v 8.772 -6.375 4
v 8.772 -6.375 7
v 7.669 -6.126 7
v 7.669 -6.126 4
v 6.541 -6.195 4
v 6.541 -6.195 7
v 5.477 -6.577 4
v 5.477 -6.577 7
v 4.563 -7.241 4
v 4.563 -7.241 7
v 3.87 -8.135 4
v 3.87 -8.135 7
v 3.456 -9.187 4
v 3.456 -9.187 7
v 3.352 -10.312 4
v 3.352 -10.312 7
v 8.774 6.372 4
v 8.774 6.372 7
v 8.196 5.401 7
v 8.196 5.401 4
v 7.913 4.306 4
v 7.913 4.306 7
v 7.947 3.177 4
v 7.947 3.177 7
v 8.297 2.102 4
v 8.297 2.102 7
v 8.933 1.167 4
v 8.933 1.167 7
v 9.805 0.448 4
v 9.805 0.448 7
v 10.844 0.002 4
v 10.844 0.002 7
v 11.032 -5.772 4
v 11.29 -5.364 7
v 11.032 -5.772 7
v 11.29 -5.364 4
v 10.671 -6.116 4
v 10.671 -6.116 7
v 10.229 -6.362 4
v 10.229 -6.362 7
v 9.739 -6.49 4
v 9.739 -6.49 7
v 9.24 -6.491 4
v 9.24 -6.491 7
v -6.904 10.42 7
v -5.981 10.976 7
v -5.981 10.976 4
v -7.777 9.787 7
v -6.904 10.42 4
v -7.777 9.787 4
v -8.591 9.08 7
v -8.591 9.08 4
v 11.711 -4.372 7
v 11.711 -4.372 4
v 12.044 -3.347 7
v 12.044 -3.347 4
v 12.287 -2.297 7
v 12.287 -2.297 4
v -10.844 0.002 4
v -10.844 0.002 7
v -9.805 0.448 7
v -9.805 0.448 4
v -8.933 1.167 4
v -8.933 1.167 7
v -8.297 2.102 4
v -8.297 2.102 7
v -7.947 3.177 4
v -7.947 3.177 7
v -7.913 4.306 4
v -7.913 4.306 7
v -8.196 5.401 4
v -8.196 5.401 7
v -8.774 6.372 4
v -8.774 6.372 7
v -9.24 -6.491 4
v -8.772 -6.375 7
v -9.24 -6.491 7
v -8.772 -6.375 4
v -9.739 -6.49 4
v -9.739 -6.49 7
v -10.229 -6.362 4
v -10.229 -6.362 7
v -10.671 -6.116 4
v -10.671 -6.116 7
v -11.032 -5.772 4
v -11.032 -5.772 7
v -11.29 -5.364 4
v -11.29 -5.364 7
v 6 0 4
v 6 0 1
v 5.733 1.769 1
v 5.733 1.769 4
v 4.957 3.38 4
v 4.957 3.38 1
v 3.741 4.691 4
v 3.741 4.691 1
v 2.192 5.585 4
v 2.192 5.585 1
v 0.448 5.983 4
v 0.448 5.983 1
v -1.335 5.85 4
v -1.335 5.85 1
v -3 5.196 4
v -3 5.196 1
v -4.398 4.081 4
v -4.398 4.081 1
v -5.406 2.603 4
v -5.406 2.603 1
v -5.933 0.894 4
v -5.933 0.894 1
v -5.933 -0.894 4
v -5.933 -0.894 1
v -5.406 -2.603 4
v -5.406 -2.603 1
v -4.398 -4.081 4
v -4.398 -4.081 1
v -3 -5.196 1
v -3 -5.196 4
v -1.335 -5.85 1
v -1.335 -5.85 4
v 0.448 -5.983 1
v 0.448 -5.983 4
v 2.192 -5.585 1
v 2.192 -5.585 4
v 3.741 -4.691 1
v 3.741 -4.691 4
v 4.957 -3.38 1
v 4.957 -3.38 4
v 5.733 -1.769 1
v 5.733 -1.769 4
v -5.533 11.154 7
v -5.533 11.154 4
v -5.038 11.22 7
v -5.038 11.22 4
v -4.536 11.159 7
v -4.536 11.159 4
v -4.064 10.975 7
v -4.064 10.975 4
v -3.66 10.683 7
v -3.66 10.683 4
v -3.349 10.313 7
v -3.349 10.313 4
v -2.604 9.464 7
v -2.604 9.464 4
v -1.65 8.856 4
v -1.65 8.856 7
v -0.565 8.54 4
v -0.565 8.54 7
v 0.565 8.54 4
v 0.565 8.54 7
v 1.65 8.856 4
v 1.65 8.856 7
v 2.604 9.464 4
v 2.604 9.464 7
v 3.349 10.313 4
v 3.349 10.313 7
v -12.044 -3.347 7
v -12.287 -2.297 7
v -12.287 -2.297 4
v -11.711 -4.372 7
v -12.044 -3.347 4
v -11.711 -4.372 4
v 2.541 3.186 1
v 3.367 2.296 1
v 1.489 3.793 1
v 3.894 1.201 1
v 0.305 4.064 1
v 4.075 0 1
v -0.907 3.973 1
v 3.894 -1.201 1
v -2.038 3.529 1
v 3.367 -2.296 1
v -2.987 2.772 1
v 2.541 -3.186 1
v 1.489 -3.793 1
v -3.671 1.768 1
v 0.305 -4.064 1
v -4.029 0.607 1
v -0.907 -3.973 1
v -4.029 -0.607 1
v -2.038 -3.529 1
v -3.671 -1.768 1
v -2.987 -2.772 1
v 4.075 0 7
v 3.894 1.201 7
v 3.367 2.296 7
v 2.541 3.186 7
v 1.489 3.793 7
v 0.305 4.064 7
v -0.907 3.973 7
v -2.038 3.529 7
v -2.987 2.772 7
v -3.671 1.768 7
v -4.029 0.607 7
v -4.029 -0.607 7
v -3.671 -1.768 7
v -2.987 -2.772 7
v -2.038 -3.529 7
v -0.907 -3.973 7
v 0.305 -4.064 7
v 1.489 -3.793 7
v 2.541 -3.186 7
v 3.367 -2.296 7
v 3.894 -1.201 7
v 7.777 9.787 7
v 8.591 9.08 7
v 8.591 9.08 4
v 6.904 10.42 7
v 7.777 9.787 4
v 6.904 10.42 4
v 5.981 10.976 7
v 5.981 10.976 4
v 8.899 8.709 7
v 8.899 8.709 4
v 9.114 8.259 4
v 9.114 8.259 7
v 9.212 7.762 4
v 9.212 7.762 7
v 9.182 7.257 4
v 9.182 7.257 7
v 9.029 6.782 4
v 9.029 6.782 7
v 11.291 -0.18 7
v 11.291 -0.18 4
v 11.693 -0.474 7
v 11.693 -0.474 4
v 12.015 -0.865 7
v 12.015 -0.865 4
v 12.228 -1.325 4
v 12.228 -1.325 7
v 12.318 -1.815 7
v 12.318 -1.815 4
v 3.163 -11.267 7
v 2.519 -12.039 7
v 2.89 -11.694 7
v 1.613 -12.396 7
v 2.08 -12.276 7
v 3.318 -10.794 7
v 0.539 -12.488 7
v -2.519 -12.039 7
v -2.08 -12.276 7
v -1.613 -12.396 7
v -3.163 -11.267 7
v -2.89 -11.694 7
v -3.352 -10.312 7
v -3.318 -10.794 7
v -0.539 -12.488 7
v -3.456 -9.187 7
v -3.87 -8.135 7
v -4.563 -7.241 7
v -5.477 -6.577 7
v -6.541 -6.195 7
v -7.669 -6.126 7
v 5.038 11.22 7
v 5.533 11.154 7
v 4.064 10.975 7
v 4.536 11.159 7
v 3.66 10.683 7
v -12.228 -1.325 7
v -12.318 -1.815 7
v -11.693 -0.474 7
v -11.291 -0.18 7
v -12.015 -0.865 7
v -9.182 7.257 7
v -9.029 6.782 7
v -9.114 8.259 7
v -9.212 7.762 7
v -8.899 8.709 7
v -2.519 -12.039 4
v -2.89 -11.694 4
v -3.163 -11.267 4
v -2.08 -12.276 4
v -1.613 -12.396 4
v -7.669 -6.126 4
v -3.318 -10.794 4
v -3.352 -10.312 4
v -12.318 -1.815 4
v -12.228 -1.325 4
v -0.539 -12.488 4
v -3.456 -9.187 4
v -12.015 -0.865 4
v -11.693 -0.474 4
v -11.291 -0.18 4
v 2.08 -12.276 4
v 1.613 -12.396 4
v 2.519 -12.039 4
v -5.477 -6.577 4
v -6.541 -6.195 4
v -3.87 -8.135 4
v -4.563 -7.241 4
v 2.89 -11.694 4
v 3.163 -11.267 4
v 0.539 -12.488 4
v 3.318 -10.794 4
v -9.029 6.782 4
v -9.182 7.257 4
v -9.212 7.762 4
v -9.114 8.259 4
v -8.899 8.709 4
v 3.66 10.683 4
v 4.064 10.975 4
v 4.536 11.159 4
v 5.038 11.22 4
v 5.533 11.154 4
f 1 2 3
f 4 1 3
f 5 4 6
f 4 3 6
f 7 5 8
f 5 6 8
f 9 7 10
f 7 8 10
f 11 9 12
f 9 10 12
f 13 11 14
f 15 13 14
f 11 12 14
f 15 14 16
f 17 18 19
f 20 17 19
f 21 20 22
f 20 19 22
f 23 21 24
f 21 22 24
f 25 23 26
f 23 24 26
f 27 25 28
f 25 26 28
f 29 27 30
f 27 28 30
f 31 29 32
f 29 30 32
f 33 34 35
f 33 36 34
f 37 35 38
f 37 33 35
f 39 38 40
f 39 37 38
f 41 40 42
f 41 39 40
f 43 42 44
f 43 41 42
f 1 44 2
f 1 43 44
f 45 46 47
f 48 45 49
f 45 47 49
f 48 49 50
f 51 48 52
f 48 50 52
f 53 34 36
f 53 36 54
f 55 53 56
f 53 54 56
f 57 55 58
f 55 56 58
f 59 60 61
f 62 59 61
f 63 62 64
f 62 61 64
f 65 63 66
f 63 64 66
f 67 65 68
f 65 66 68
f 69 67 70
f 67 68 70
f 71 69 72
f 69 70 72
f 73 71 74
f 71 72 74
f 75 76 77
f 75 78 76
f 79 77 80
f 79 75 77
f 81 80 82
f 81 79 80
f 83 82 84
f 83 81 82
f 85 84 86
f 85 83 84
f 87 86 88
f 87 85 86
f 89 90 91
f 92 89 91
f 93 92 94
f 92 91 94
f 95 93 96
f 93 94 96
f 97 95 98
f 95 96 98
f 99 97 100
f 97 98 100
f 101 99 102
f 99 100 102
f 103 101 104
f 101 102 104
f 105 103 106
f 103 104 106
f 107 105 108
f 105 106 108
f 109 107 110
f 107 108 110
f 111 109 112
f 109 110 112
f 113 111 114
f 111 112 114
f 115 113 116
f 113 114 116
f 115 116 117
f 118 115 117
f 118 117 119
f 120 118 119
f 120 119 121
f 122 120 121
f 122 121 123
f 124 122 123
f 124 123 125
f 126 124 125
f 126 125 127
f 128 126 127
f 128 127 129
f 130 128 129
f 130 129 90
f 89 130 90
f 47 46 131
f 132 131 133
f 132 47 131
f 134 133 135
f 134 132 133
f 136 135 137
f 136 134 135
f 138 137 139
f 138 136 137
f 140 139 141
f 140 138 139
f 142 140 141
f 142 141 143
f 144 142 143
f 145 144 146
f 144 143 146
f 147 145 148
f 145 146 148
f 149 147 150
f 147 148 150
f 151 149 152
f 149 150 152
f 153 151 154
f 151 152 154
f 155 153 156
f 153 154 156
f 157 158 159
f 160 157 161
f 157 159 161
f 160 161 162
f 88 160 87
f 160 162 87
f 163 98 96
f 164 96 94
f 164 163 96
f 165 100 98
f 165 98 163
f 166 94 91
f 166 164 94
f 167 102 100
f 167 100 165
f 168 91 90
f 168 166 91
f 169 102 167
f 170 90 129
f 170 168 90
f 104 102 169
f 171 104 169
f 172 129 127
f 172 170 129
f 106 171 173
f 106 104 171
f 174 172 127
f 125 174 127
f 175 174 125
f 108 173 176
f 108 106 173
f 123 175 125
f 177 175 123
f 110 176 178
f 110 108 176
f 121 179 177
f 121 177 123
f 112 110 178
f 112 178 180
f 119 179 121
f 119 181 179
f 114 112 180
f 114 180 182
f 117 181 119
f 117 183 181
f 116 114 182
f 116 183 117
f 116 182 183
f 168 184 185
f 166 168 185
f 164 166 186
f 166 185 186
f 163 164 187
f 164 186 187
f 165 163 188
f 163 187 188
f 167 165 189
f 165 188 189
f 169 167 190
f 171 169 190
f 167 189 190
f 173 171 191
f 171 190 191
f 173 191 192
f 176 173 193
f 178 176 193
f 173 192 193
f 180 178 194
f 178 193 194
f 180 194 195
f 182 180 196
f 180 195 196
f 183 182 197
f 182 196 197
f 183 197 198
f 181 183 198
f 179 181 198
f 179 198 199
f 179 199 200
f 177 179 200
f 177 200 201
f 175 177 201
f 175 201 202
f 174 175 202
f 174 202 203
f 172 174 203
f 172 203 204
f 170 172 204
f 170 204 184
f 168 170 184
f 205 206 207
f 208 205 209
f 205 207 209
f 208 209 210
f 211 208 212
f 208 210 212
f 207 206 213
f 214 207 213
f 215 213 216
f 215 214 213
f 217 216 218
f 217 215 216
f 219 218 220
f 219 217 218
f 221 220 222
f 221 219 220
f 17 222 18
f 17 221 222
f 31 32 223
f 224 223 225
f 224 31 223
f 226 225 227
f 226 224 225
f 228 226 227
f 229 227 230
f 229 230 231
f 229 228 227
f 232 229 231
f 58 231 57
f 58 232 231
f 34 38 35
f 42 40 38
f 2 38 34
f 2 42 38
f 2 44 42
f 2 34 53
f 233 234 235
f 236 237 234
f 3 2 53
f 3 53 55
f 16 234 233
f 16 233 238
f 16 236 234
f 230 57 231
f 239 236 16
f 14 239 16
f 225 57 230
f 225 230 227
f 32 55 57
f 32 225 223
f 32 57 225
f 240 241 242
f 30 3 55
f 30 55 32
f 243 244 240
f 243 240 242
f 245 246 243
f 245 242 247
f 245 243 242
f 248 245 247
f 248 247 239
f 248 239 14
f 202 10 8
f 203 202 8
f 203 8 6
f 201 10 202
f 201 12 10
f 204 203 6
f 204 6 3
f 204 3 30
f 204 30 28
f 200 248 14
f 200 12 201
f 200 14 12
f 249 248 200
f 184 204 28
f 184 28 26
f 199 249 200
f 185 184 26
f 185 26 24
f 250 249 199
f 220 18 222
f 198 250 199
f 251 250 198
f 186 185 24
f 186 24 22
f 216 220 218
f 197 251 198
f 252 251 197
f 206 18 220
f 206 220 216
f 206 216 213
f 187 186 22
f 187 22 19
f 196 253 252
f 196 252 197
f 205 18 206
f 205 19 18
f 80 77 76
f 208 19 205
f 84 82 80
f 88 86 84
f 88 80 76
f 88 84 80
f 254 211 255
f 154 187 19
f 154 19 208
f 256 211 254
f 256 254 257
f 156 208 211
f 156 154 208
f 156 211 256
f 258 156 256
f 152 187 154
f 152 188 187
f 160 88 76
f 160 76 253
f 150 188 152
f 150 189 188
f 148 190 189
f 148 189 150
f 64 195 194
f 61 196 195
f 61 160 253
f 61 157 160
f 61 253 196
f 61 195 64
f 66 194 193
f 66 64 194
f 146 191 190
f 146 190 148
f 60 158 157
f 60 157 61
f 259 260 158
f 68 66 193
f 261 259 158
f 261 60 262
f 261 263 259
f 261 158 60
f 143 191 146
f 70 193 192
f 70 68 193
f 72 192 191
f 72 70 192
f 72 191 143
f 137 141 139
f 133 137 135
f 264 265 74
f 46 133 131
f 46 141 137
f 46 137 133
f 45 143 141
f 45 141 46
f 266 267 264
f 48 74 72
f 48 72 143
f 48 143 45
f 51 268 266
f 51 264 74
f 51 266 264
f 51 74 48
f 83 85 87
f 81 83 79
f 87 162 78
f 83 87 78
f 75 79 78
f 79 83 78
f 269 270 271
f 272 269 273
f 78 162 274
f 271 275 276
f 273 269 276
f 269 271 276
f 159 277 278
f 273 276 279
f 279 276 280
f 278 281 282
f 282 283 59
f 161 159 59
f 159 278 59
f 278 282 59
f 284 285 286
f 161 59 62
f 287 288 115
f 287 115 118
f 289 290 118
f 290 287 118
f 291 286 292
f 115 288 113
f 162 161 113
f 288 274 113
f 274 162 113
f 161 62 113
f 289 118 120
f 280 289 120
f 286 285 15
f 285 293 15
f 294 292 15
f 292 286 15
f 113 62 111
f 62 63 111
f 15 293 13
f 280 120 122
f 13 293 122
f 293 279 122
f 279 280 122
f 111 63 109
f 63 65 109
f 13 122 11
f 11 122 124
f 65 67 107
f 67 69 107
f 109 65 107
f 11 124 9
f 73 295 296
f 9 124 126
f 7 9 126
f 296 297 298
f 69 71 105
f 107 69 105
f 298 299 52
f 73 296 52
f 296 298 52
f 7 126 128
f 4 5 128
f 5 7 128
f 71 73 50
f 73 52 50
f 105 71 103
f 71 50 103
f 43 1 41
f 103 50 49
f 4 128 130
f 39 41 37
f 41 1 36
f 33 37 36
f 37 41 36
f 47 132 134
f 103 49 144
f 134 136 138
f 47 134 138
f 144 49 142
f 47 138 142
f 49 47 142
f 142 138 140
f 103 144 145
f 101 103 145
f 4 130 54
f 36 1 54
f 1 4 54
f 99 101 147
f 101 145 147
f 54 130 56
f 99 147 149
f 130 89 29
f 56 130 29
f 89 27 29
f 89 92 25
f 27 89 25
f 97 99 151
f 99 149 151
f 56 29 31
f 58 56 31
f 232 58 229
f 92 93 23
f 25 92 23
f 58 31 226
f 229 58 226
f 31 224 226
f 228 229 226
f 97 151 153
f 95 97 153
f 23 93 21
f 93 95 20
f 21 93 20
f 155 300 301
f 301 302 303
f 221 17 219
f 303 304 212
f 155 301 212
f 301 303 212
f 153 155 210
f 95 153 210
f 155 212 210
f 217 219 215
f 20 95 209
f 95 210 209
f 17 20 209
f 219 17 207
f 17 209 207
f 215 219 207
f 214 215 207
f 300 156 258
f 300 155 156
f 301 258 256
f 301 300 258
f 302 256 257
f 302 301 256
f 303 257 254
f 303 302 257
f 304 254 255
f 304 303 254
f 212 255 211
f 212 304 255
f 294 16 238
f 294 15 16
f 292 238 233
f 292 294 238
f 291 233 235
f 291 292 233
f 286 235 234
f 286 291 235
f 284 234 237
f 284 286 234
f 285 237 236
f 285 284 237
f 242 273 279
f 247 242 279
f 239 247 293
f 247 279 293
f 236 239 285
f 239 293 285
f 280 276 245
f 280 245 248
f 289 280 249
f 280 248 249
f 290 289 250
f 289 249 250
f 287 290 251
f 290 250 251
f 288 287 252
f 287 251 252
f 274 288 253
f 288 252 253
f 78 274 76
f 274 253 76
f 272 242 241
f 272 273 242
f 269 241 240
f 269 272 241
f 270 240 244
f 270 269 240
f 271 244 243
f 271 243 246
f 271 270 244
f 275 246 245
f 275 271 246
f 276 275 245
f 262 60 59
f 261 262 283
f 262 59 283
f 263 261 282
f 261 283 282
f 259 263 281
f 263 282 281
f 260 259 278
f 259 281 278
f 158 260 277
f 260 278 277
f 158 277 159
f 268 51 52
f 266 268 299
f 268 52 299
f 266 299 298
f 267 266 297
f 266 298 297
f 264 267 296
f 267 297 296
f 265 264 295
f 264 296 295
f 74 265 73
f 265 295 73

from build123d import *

# Parameters (mm, degrees)
SKETCH_R           = 6
PAD_DEPTH          = 4
SKETCH001_R        = 12.5
PAD001_DEPTH       = 3
SKETCH002_R        = 4
POCKET_DEPTH       = 3
POLARPATTERN_COUNT = 5
FILLET_R           = 2
SKETCH003_R        = 2.31
POCKET001_DEPTH    = 3
POCKET001_FACE25_R = 6
POCKET002_DEPTH    = 1
POCKET002_FACE26_R = 2.31
POCKET003_DEPTH    = 1.5
POCKET003_FACE26_R = 2.31
POCKET004_DEPTH    = 1.501
SKETCH005_R        = 6
SKETCH005_R_2      = 2.31
PAD002_DEPTH       = 3
PAD002_FACE38_R    = 2.31
PAD003_DEPTH       = 3
SKETCH006_R        = 4.075
POCKET005_DEPTH    = 6.001


with BuildPart() as part:
    # Sketch → Pad (new body)
    with BuildSketch(Plane.XY):
        Circle(SKETCH_R)
        Polygon((-2.286307, -3.96), (2.286307, -3.96), (4.572614, 0), (2.286307, 3.96), (-2.286307, 3.96), (-4.572614, 0), align=None, mode=Mode.SUBTRACT)
    extrude(amount=PAD_DEPTH)

    # Sketch001 (on Face9 of Pad) → Pad001 (join)
    with BuildSketch(Plane.XY.offset(4)):
        Circle(SKETCH001_R)
    extrude(amount=PAD001_DEPTH)

    # Sketch002 (on Face3 of Pad001) → Pocket (cut)
    with BuildSketch(Plane.XY.offset(7)):
        with Locations((0, 12.5)):
            Circle(SKETCH002_R)
    pocket = extrude(amount=-POCKET_DEPTH, mode=Mode.SUBTRACT)

    # PolarPattern: Pocket ×5 about axis
    polarpattern_axis = Axis((0, 0, 0), (0, 0, 1))
    for i in range(1, POLARPATTERN_COUNT):
        add(pocket.rotate(polarpattern_axis, i * 360 / POLARPATTERN_COUNT), mode=Mode.SUBTRACT)

    # Fillet
    fillet_edges = [part.edges().sort_by_distance(p)[0] for p in [
        (-12.499674, -0.090275, 5.5),
        (-10.059387, 7.420158, 5.5),
        (-3.948468, 11.86, 5.5),
        (3.948468, 11.86, 5.5),
        (-3.776755, -11.915793, 5.5),
        (-10.165511, -7.27409, 5.5),
        (10.165511, -7.27409, 5.5),
        (3.776755, -11.915793, 5.5),
        (10.059387, 7.420158, 5.5),
        (12.499674, -0.090275, 5.5),
    ]]
    fillet(fillet_edges, radius=FILLET_R)

    # Sketch003 (on Face31 of Fillet) → Pocket001 (cut)
    with BuildSketch(Plane(origin=(0, 0, 4), x_dir=(1, 0, 0), z_dir=(0, 0, -1))):
        Circle(SKETCH003_R)
    extrude(amount=-POCKET001_DEPTH, mode=Mode.SUBTRACT)

    # Pocket001 Face25 → Pocket002 (cut)
    with BuildSketch(Plane(origin=(0, 0, 0), x_dir=(0, -1, 0), z_dir=(0, 0, -1))):
        Circle(POCKET001_FACE25_R)
        Polygon((0, 4.572614), (3.96, 2.286307), (3.96, -2.286307), (0, -4.572614), (-3.96, -2.286307), (-3.96, 2.286307), align=None, mode=Mode.SUBTRACT)
    extrude(amount=-POCKET002_DEPTH, mode=Mode.SUBTRACT)

    # Pocket002 Face26 → Pocket003 (cut)
    with BuildSketch(Plane(origin=(0, 0, 4), x_dir=(0, -1, 0), z_dir=(0, 0, -1))):
        Polygon((0, 4.572614), (-3.96, 2.286307), (-3.96, -2.286307), (0, -4.572614), (3.96, -2.286307), (3.96, 2.286307), align=None)
        Circle(POCKET002_FACE26_R, mode=Mode.SUBTRACT)
    extrude(amount=-POCKET003_DEPTH, mode=Mode.SUBTRACT)

    # Pocket003 Face26 → Pocket004 (cut, through all)
    with BuildSketch(Plane(origin=(0, 0, 5.5), x_dir=(0, -1, 0), z_dir=(0, 0, -1))):
        Polygon((0, 4.572614), (-3.96, 2.286307), (-3.96, -2.286307), (0, -4.572614), (3.96, -2.286307), (3.96, 2.286307), align=None)
        Circle(POCKET003_FACE26_R, mode=Mode.SUBTRACT)
    extrude(amount=-POCKET004_DEPTH, mode=Mode.SUBTRACT)

    # Sketch005 (on Face30 of Pocket004) → Pad002 (join)
    with BuildSketch(Plane(origin=(0, 0, 1), x_dir=(1, 0, 0), z_dir=(0, 0, -1))):
        Circle(SKETCH005_R)
        Circle(SKETCH005_R_2, mode=Mode.SUBTRACT)
    extrude(amount=-PAD002_DEPTH)

    # Pad002 Face38 → Pad003 (add)
    with BuildSketch(Plane(origin=(0, 0, 4), x_dir=(0, 1, 0), z_dir=(0, 0, 1))):
        Polygon((0, 4.572614), (-3.96, 2.286307), (-3.96, -2.286307), (0, -4.572614), (3.96, -2.286307), (3.96, 2.286307), align=None)
        Circle(PAD002_FACE38_R, mode=Mode.SUBTRACT)
    extrude(amount=PAD003_DEPTH)

    # Sketch006 (on Face24 of Pad003) → Pocket005 (cut, through all)
    with BuildSketch(Plane.XY.offset(7)):
        Circle(SKETCH006_R)
    extrude(amount=-POCKET005_DEPTH, mode=Mode.SUBTRACT)


solid = part.part
